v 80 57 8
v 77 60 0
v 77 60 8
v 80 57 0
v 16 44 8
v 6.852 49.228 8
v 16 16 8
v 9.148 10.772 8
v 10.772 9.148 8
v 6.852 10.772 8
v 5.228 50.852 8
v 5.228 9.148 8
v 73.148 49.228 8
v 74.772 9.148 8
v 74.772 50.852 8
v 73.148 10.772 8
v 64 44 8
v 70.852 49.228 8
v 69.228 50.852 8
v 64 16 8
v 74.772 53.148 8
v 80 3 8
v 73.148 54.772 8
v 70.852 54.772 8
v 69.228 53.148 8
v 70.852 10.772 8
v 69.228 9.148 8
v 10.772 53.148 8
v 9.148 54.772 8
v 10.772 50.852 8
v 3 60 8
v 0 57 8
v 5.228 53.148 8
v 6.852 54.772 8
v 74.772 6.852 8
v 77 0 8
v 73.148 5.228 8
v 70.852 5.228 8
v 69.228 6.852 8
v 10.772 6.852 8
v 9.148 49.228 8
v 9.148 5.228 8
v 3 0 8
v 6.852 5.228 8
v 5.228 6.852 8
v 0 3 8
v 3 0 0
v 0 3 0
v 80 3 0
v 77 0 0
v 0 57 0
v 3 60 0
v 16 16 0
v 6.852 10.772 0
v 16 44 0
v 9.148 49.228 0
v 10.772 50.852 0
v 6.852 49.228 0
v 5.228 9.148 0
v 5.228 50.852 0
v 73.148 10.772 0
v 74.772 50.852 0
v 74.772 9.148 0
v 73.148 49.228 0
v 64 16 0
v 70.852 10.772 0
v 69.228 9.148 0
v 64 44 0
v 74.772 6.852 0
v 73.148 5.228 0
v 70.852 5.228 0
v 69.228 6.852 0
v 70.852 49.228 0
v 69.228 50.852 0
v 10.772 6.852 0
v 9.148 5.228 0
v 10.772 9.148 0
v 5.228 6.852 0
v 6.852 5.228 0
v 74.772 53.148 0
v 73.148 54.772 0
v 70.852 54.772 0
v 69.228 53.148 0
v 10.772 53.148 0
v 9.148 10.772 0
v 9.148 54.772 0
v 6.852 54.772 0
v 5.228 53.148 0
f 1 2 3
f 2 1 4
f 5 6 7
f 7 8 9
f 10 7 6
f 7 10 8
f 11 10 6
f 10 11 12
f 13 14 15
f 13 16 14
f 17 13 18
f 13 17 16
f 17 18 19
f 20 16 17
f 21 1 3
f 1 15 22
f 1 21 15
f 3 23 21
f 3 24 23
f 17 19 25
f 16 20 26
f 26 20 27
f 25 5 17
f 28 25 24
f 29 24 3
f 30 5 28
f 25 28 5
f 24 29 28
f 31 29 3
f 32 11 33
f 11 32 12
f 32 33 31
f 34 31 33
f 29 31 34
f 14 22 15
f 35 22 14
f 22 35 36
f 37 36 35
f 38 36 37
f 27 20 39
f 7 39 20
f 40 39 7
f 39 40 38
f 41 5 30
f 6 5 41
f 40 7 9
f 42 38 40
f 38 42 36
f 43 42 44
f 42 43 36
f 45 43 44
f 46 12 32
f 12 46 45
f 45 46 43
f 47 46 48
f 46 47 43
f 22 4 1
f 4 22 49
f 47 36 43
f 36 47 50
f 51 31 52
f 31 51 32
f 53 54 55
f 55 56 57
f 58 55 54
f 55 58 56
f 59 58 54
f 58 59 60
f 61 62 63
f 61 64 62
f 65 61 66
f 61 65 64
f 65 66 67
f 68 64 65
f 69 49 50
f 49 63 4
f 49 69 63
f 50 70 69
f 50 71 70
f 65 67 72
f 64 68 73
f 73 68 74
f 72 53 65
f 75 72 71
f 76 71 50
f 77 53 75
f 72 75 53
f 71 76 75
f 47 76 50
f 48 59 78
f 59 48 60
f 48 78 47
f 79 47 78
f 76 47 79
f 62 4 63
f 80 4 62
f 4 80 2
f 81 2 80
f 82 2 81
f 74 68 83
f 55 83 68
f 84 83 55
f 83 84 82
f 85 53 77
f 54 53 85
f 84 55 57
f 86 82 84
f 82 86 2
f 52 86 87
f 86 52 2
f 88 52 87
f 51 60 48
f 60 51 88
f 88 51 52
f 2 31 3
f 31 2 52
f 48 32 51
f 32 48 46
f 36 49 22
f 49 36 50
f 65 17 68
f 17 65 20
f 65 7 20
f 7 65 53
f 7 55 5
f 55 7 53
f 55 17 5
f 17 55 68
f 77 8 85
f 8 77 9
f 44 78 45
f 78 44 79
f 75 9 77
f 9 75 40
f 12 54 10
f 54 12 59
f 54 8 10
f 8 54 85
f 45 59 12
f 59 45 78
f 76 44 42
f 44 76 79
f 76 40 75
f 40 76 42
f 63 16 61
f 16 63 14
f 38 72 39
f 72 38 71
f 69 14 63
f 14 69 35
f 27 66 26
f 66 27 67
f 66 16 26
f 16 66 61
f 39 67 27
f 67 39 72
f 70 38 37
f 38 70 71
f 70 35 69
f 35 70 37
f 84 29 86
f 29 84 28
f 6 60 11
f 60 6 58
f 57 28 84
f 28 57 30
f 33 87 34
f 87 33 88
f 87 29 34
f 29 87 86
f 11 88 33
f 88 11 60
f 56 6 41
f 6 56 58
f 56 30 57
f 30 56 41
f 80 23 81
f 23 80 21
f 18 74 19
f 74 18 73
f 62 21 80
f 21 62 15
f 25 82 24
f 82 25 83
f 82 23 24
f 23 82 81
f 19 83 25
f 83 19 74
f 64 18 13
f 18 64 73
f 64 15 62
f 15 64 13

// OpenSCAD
$fn = 32;

// ----------------------------------------------------------------------
// Frame plate: 80 x 60 frame, 16 mm rails
// ----------------------------------------------------------------------

// --- parameters (mm) ---
plate_l = 80;             // plate length, X
plate_w = 60;             // plate width, Y
plate_t = 8;              // plate thickness, Z (extrusion height)
corner_c = 3;             // corner chamfer
frame_bar = 16;           // frame rail width
bolt_r = 3;               // corner bolt window radius
bolt_inset = 8;           // bolt centre inset from the edges

win_l = plate_l - 2 * frame_bar;  // window length
win_w = plate_w - 2 * frame_bar;  // window width
bolt_d = 2 * bolt_r;  // corner hole diameter

profile = [[3, 0], [77, 0], [80, 3], [80, 57], [77, 60], [3, 60], [0, 57], [0, 3]];  // primary outline, 8 points, counter clockwise
void_1 = [[16, 16], [64, 16], [64, 44], [16, 44]];  // the window, 4 points
void_2 = [[10.772, 9.148], [9.148, 10.772], [6.852, 10.772], [5.228, 9.148], [5.228, 6.852], [6.852, 5.228], [9.148, 5.228], [10.772, 6.852]];  // corner bolt window, 8 points
void_3 = [[74.772, 9.148], [73.148, 10.772], [70.852, 10.772], [69.228, 9.148], [69.228, 6.852], [70.852, 5.228], [73.148, 5.228], [74.772, 6.852]];  // corner bolt window, 8 points
void_4 = [[10.772, 53.148], [9.148, 54.772], [6.852, 54.772], [5.228, 53.148], [5.228, 50.852], [6.852, 49.228], [9.148, 49.228], [10.772, 50.852]];  // corner bolt window, 8 points
void_5 = [[74.772, 53.148], [73.148, 54.772], [70.852, 54.772], [69.228, 53.148], [69.228, 50.852], [70.852, 49.228], [73.148, 49.228], [74.772, 50.852]];  // corner bolt window, 8 points

// --- the one profile operation ---
difference() {
  linear_extrude(height = plate_t) polygon(points = profile);
  translate([0, 0, -1])
    linear_extrude(height = plate_t + 2) polygon(points = void_1);
  translate([0, 0, -1])
    linear_extrude(height = plate_t + 2) polygon(points = void_2);
  translate([0, 0, -1])
    linear_extrude(height = plate_t + 2) polygon(points = void_3);
  translate([0, 0, -1])
    linear_extrude(height = plate_t + 2) polygon(points = void_4);
  translate([0, 0, -1])
    linear_extrude(height = plate_t + 2) polygon(points = void_5);
}
